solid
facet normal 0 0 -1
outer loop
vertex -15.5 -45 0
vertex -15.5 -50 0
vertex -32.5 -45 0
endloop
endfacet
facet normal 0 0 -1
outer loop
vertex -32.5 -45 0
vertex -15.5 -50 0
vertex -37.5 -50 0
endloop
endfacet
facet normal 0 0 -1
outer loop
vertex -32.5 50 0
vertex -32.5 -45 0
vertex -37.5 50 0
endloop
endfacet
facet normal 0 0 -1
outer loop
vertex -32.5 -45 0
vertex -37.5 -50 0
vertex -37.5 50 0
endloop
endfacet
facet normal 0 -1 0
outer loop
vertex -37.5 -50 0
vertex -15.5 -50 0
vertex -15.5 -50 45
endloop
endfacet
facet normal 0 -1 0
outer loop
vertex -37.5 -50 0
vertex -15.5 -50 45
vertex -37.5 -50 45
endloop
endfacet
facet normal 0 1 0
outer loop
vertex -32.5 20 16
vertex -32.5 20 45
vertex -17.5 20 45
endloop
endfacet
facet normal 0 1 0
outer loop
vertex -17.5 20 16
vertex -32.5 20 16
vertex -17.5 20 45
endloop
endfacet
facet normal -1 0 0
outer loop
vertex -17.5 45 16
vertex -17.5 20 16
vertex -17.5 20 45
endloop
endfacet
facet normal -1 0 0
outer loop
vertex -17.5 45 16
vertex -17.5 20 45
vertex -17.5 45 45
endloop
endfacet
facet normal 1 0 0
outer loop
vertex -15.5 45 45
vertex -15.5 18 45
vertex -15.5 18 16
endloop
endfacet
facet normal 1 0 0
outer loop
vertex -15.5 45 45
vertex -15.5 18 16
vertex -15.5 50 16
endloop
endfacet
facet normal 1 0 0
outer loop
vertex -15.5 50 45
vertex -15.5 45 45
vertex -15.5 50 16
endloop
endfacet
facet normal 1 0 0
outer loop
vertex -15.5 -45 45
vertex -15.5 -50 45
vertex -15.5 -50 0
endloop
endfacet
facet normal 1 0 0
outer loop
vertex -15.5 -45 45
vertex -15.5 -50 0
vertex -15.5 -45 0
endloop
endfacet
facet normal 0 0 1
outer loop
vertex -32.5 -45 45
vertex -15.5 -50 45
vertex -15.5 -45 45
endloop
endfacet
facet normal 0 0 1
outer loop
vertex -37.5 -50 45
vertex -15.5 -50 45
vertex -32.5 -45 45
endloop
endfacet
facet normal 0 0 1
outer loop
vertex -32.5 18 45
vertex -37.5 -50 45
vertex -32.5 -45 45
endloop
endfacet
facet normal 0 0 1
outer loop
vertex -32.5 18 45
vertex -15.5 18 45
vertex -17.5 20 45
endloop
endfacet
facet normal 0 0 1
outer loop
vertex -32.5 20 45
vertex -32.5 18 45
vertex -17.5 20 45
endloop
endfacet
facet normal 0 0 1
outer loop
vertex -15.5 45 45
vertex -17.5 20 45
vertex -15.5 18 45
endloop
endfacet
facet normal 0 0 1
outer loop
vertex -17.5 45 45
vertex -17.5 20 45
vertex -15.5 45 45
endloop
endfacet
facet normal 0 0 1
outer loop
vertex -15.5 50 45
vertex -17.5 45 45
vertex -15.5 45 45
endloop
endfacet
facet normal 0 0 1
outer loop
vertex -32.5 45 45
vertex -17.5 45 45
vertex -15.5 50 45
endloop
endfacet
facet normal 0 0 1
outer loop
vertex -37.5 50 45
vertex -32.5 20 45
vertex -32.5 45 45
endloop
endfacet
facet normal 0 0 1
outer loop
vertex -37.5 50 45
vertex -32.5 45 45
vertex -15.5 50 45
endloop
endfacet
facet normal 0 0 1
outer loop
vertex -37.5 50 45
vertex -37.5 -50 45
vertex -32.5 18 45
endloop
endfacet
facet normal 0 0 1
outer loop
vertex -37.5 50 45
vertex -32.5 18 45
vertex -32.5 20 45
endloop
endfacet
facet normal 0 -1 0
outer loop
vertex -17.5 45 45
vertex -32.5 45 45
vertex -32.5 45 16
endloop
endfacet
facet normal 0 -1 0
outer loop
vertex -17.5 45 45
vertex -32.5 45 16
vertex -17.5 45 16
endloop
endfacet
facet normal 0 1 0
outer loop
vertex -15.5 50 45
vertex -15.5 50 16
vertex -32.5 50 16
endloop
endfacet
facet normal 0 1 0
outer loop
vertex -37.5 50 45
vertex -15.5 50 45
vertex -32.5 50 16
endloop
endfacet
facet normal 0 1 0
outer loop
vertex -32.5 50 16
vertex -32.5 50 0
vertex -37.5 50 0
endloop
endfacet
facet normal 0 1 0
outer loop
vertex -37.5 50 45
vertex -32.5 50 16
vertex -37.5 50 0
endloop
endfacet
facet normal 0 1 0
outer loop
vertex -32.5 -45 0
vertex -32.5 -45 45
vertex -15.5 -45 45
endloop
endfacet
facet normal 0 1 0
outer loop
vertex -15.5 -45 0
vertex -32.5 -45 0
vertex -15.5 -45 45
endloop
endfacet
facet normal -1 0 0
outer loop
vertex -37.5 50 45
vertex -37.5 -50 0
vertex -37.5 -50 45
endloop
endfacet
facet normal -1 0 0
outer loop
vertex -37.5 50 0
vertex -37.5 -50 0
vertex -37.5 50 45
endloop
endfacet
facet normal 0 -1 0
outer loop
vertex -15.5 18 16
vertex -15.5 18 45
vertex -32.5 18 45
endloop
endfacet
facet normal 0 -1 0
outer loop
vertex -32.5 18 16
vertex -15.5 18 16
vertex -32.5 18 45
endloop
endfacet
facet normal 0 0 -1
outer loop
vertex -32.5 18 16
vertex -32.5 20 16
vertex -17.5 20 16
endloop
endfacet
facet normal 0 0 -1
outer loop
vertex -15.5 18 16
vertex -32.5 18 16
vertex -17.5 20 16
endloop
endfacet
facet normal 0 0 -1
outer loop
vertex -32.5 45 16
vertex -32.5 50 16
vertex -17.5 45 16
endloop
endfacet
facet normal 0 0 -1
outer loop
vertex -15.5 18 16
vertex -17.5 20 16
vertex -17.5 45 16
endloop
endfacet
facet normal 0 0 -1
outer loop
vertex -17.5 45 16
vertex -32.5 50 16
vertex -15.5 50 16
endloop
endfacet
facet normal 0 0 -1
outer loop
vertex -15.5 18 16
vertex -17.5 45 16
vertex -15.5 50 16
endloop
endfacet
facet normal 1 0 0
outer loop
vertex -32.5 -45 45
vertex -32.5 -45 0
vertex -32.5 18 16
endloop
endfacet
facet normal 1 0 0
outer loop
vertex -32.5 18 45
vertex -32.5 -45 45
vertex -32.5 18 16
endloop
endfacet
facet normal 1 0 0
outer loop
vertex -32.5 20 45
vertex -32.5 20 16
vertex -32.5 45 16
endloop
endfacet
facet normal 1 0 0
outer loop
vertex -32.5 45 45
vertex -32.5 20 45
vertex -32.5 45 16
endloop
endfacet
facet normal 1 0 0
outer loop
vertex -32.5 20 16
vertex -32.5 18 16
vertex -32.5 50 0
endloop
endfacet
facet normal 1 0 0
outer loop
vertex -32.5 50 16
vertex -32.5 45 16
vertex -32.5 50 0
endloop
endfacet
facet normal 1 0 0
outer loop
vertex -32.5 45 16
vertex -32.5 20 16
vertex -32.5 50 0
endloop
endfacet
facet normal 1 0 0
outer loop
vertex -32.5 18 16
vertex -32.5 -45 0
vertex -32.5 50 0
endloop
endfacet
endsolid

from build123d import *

# Parameters (mm, degrees)
SKETCH1_W           = 100
SKETCH1_H           = 75
BOSS_EXTRUDE1_DEPTH = 45
SKETCH2_W           = 15
SKETCH2_H           = 25
CUT_EXTRUDE1_DEPTH  = 78.014609004
SKETCH3_W           = 30.197143083
SKETCH3_H           = 100
CUT_EXTRUDE2_DEPTH  = 78.014609004
SKETCH4_W           = 17
SKETCH4_H           = 32
CUT_EXTRUDE3_DEPTH  = 16


with BuildPart() as part:
    # Sketch1 → Boss-Extrude1 (new body)
    with BuildSketch(Plane(origin=(0, 0, 0), x_dir=(0, 1, 0), z_dir=(0, 0, 1))):
        Rectangle(SKETCH1_W, SKETCH1_H)
    extrude(amount=BOSS_EXTRUDE1_DEPTH)

    # Sketch2 → Cut-Extrude1 (cut, through all)
    with BuildSketch(Plane.XY.offset(45)):
        Polygon((-15.5, 18), (-32.5, 18), (-32.5, -45), (32.5, -45), (32.5, 45), (-15.5, 45), (-15.5, 20), align=None)
        with Locations((-25, 32.5)):
            Rectangle(SKETCH2_W, SKETCH2_H)
    extrude(amount=-CUT_EXTRUDE1_DEPTH, mode=Mode.SUBTRACT)

    # Sketch3 → Cut-Extrude2 (cut, through all)
    with BuildSketch(Plane.XY.offset(45)):
        with Locations((-0.401428459, 0)):
            Rectangle(SKETCH3_W, SKETCH3_H)
    extrude(amount=-CUT_EXTRUDE2_DEPTH, mode=Mode.SUBTRACT)


with BuildPart() as cut_extrude2_kept_piece:
    # of the separate pieces the step leaves, the one the design keeps (cut_extrude2_pieces_kept)
    add(part.part.solids().sort_by_distance((-37.5, -50, 0))[0])

    # Sketch4 → Cut-Extrude3 (cut)
    with BuildSketch(Plane.XY):
        with Locations((-24, 34)):
            Rectangle(SKETCH4_W, SKETCH4_H)
    extrude(amount=CUT_EXTRUDE3_DEPTH, mode=Mode.SUBTRACT)


solid = cut_extrude2_kept_piece.part
